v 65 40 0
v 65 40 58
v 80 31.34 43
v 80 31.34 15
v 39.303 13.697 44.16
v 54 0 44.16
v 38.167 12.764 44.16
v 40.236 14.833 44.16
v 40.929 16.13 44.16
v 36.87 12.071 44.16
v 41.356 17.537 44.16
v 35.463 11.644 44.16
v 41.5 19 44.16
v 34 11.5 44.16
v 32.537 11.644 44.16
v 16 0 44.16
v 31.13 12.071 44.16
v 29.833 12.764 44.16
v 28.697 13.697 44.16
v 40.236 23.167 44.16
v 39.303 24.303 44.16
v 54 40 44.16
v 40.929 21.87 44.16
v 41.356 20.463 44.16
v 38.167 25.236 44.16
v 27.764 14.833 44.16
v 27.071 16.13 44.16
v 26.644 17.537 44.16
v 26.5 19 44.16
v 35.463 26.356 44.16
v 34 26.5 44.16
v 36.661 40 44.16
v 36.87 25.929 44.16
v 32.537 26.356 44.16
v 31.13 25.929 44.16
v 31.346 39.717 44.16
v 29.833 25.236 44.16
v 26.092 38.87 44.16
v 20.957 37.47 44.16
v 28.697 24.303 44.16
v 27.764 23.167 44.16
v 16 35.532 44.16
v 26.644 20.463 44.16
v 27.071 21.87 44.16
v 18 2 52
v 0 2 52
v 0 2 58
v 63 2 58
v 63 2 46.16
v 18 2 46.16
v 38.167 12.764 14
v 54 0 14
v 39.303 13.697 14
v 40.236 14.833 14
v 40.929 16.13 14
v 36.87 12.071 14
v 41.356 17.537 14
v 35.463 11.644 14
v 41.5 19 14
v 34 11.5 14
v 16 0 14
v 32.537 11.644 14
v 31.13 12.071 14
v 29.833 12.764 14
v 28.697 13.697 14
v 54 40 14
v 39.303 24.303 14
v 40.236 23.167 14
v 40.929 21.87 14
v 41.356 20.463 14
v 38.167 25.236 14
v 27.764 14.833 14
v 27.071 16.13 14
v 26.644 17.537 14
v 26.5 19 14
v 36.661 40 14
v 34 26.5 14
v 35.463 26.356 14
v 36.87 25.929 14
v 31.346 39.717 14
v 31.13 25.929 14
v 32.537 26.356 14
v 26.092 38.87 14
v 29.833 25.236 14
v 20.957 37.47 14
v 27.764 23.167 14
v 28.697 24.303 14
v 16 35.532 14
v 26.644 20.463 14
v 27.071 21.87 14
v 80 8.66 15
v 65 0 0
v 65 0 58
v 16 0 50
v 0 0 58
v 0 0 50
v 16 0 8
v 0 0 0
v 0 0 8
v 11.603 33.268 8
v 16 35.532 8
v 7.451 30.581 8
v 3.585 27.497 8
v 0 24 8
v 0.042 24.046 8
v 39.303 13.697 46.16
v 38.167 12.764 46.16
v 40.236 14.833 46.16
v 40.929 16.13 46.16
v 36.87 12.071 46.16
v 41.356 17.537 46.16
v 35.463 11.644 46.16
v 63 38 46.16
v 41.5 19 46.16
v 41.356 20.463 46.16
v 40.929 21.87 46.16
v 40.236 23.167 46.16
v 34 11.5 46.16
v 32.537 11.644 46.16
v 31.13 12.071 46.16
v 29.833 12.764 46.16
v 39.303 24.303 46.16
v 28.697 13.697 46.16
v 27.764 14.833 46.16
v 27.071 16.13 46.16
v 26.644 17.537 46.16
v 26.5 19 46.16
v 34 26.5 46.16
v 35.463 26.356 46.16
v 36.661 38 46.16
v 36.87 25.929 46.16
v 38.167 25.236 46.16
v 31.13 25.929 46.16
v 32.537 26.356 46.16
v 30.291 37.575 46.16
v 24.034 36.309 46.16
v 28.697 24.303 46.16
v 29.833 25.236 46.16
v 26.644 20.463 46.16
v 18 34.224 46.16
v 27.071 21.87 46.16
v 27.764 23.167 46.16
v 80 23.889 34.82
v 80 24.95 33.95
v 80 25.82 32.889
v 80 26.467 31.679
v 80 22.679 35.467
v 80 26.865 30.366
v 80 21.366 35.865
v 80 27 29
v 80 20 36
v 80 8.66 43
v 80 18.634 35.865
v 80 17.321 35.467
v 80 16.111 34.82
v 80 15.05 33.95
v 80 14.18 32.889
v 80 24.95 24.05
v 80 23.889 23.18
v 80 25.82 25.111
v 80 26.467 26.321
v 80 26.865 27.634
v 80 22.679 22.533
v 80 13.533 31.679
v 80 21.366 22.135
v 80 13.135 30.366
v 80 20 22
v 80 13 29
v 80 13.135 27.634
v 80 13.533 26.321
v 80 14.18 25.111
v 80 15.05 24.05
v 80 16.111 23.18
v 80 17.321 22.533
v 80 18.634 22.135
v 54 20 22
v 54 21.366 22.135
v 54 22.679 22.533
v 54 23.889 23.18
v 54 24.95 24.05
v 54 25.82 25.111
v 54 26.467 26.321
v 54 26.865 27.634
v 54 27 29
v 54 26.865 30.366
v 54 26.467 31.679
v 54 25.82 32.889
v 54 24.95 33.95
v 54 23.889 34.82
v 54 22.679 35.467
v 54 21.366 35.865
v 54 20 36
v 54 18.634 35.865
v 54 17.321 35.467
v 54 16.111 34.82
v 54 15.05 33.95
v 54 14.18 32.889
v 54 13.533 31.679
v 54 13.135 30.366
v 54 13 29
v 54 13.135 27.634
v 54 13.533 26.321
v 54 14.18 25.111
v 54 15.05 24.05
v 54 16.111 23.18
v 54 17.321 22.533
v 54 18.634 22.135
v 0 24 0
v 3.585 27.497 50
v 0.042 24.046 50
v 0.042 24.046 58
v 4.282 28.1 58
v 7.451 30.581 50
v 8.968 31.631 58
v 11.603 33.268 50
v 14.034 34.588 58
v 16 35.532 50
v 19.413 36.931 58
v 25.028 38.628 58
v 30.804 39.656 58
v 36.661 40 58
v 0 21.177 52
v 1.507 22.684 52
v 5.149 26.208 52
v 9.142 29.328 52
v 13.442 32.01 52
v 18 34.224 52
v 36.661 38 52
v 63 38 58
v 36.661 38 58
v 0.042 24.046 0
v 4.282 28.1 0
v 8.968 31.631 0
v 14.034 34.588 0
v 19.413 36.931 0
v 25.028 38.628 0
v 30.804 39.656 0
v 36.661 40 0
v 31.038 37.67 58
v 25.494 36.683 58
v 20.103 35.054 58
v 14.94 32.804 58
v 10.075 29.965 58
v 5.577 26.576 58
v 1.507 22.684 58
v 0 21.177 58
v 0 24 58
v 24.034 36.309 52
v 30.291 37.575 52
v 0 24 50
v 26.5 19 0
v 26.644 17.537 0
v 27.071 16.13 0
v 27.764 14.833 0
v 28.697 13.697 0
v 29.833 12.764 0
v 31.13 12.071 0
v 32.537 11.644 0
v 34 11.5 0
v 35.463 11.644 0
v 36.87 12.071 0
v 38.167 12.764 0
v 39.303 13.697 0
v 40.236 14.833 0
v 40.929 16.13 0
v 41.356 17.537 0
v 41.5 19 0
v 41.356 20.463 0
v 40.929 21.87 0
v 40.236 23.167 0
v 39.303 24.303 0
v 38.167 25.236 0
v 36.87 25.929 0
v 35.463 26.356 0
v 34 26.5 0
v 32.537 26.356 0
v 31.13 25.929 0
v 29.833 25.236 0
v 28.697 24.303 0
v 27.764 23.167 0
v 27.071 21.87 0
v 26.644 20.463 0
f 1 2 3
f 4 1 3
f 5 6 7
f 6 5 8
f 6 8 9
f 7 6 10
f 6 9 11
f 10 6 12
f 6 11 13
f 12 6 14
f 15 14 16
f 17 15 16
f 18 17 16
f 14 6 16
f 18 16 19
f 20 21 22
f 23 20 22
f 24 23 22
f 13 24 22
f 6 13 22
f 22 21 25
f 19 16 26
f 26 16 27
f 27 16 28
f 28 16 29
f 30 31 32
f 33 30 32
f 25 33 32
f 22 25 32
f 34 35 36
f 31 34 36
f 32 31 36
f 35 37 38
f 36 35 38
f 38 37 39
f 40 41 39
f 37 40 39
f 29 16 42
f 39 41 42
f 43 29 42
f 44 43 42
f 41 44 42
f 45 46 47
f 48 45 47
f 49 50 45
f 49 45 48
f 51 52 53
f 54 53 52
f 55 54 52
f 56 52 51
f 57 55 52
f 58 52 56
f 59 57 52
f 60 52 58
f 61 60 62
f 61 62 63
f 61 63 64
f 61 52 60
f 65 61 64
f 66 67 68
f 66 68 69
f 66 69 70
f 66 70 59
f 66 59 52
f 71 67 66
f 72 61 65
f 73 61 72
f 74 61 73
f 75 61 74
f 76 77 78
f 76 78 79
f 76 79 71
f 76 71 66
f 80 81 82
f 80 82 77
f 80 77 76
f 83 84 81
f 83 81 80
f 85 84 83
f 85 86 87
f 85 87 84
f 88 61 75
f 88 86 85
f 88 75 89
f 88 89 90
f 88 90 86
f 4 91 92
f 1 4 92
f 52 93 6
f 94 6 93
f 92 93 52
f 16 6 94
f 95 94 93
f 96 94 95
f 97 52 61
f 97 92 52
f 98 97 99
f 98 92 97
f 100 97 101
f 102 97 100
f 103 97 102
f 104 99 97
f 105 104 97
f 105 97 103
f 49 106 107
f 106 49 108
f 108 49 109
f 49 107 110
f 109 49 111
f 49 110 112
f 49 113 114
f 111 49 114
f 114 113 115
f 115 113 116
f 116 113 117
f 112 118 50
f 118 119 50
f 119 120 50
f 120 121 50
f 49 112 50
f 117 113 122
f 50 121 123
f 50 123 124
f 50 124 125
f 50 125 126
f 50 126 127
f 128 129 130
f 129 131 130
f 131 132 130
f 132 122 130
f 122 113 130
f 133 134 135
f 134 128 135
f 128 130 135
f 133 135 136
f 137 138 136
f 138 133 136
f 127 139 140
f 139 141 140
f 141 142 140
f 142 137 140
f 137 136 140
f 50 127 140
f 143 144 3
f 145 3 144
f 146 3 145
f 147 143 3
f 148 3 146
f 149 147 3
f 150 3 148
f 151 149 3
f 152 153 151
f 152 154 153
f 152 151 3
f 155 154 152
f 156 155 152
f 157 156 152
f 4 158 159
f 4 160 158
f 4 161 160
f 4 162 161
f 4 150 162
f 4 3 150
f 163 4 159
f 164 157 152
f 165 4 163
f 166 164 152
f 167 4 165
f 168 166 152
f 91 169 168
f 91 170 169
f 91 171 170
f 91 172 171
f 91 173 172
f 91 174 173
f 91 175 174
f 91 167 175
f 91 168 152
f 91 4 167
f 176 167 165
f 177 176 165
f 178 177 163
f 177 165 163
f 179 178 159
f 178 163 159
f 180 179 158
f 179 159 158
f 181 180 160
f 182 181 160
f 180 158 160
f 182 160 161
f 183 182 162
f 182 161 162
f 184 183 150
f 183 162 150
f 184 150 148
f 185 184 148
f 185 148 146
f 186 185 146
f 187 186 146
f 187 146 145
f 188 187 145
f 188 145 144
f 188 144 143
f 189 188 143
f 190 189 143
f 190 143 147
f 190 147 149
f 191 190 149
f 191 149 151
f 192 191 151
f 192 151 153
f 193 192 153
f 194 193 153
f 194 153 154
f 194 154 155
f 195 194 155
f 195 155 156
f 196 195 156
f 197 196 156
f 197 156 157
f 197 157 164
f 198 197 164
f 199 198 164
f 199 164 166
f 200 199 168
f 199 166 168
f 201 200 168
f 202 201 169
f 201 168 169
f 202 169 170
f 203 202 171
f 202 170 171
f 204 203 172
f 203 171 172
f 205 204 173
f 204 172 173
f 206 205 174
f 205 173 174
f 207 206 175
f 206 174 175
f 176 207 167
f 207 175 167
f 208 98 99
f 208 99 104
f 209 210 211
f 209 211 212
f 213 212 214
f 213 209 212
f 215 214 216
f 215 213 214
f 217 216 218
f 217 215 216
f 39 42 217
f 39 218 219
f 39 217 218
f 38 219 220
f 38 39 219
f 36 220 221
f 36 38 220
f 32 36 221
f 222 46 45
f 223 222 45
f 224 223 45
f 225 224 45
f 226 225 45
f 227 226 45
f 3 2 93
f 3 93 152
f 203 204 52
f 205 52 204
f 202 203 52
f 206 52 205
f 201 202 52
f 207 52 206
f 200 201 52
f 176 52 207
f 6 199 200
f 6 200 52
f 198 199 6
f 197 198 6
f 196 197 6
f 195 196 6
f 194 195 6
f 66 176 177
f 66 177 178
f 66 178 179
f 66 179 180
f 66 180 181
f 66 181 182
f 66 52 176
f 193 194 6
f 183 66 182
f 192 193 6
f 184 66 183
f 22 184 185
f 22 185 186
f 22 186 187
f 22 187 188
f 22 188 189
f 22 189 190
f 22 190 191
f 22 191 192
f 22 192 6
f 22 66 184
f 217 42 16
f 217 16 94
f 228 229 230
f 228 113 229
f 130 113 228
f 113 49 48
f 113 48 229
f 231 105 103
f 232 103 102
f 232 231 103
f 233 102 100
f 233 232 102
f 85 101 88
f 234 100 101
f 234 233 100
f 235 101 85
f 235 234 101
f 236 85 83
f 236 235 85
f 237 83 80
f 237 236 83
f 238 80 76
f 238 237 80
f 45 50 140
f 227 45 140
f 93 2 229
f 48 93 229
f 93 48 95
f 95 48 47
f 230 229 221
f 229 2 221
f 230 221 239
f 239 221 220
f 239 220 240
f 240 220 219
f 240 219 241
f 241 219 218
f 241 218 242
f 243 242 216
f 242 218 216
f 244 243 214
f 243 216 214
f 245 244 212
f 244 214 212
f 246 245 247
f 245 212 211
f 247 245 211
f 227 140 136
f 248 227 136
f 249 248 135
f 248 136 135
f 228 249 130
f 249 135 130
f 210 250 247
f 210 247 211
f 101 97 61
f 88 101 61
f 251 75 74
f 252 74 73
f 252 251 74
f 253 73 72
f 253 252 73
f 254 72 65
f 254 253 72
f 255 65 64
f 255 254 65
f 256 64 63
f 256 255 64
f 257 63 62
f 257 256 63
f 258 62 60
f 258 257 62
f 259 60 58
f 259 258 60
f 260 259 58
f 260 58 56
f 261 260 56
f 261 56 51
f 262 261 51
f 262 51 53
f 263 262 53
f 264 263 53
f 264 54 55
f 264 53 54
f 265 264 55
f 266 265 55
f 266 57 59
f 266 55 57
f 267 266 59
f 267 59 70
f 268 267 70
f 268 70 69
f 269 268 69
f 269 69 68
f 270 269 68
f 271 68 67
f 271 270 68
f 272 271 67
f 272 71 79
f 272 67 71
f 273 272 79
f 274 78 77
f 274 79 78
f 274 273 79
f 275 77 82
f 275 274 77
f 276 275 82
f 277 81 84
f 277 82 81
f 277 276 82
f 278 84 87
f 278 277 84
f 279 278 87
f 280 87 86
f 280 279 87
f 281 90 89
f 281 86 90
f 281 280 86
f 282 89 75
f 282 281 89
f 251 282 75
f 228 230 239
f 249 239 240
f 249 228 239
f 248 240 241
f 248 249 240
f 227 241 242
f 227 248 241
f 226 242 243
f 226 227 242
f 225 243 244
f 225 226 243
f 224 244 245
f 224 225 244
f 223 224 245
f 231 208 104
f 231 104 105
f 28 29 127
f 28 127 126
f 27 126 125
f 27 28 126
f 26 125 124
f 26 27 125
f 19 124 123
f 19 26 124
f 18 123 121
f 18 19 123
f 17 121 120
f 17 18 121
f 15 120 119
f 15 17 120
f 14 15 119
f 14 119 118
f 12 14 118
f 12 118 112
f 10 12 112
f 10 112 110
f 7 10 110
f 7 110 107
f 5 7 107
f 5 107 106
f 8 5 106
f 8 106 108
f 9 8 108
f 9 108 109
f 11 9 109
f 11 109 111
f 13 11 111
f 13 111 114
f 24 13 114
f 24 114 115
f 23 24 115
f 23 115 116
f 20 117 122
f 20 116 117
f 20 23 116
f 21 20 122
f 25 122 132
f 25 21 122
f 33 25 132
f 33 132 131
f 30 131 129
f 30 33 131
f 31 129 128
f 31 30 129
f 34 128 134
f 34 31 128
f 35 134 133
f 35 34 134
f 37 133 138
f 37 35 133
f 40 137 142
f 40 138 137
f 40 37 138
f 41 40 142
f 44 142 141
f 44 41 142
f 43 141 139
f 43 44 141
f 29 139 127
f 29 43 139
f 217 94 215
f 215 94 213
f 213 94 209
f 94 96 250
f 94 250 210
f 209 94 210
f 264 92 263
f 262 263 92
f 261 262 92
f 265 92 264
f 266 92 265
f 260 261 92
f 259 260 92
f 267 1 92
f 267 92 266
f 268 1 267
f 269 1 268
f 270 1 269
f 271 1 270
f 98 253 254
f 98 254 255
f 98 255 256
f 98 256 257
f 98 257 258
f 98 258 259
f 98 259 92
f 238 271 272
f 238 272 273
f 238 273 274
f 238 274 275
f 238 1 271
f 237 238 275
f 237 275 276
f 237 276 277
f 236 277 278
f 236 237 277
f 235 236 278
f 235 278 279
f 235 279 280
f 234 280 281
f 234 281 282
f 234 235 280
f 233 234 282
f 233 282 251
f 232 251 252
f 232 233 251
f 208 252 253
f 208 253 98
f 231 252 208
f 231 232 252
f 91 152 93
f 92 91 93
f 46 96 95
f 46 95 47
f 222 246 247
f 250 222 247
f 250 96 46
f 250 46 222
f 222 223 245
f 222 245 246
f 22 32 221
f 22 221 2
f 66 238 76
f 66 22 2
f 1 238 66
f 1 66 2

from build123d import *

# Parameters (mm, degrees)
ESQUISSE1_R              = 7.5
BOSS_EXTRU_1_DEPTH       = 58
ENL_V_MAT_EXTRU_2_DEPTH  = 107.60206377
ESQUISSE5_R              = 7
ENL_V_MAT_EXTRU_3_DEPTH  = 107.60206377
ESQUISSE11_W             = 42
ESQUISSE11_H             = 40
ENL_V_MAT_EXTRU_50_DEPTH = 16
ESQUISSE12_W             = 30.159824364
ESQUISSE12_H             = 40
ENL_V_MAT_EXTRU_51_DEPTH = 38
ENL_V_START              = -6
ESQUISSE13_R             = 7.5
ENL_V_MAT_EXTRU_52_DEPTH = 6
ENL_V_START_2            = -5.840175636
ENL_V_MAT_EXTRU_53_DEPTH = 5.840175636


with BuildPart() as part:
    # Esquisse1 → Boss.-Extru.1 (new body)
    with BuildSketch(Plane.XY):
        with BuildLine():
            Line((0, 0), (0, 24))
            Line((0, 24), (0.042431239, 24.04563747))
            ThreePointArc((0.042431239, 24.04563747), (16.689202308, 35.8382039), (36.660658521, 40))
            Line((36.660658521, 40), (65, 40))
            Line((65, 40), (80, 31.339745962))
            Line((80, 31.339745962), (80, 8.660254038))
            Line((80, 8.660254038), (65, 0))
            Line((65, 0), (0, 0))
        make_face()
        with Locations(Location((34, 19, 0), (0, 0, 180))):
            Circle(ESQUISSE1_R, mode=Mode.SUBTRACT)
    extrude(amount=BOSS_EXTRU_1_DEPTH)

    # Esquisse4 → Enlèv. mat.-Extru.2 (cut, through all)
    with BuildSketch(Plane.XZ):
        Polygon((65, 58), (80, 43), (80, 58), align=None)
        Polygon((65, 0), (80, 0), (80, 15), align=None)
    extrude(amount=-ENL_V_MAT_EXTRU_2_DEPTH, mode=Mode.SUBTRACT)

    # Esquisse5 → Enlèv. mat.-Extru.3 (cut, through all)
    with BuildSketch(Plane(origin=(80, 0, 0), x_dir=(0, 0, -1), z_dir=(1, 0, 0))):
        with Locations((-29, 20)):
            Circle(ESQUISSE5_R)
    extrude(amount=-ENL_V_MAT_EXTRU_3_DEPTH, mode=Mode.SUBTRACT)

    # Esquisse11 → Enlèv. mat.-Extru.50 (cut)
    with BuildSketch(Plane.ZY):
        with Locations((29, 20)):
            Rectangle(ESQUISSE11_W, ESQUISSE11_H)
    extrude(amount=-ENL_V_MAT_EXTRU_50_DEPTH, mode=Mode.SUBTRACT)

    # Esquisse12 → Enlèv. mat.-Extru.51 (cut)
    with BuildSketch(Plane.ZY.offset(-16)):
        with Locations((29.079912182, 20)):
            Rectangle(ESQUISSE12_W, ESQUISSE12_H)
    extrude(amount=-ENL_V_MAT_EXTRU_51_DEPTH, mode=Mode.SUBTRACT)

    # Esquisse13 → Enlèv. mat.-Extru.52 (cut)
    with BuildSketch(Plane.XY.offset(58).offset(ENL_V_START)):
        with BuildLine():
            Line((0, 21.176651641), (0, 2))
            Line((0, 2), (63, 2))
            Line((63, 2), (63, 38))
            Line((63, 38), (36.660658521, 38))
            ThreePointArc((36.660658521, 38), (17.488060557, 34.004675744), (1.507160331, 22.683811971))
            Line((1.507160331, 22.683811971), (0, 21.176651641))
        make_face()
        with Locations(Location((34, 19, 0), (0, 0, 180))):
            Circle(ESQUISSE13_R, mode=Mode.SUBTRACT)
    extrude(amount=ENL_V_MAT_EXTRU_52_DEPTH, mode=Mode.SUBTRACT)

    # Esquisse14 → Enlèv. mat.-Extru.53 (cut)
    with BuildSketch(Plane.XY.offset(52).offset(ENL_V_START_2)):
        with BuildLine():
            Line((63, 38), (63, 2))
            Line((63, 2), (18, 2))
            Line((18, 2), (18, 34.224199524))
            ThreePointArc((18, 34.224199524), (27.141246175, 37.046581051), (36.660658521, 38))
            Line((36.660658521, 38), (63, 38))
        make_face()
    extrude(amount=ENL_V_MAT_EXTRU_53_DEPTH, mode=Mode.SUBTRACT)


solid = part.part
